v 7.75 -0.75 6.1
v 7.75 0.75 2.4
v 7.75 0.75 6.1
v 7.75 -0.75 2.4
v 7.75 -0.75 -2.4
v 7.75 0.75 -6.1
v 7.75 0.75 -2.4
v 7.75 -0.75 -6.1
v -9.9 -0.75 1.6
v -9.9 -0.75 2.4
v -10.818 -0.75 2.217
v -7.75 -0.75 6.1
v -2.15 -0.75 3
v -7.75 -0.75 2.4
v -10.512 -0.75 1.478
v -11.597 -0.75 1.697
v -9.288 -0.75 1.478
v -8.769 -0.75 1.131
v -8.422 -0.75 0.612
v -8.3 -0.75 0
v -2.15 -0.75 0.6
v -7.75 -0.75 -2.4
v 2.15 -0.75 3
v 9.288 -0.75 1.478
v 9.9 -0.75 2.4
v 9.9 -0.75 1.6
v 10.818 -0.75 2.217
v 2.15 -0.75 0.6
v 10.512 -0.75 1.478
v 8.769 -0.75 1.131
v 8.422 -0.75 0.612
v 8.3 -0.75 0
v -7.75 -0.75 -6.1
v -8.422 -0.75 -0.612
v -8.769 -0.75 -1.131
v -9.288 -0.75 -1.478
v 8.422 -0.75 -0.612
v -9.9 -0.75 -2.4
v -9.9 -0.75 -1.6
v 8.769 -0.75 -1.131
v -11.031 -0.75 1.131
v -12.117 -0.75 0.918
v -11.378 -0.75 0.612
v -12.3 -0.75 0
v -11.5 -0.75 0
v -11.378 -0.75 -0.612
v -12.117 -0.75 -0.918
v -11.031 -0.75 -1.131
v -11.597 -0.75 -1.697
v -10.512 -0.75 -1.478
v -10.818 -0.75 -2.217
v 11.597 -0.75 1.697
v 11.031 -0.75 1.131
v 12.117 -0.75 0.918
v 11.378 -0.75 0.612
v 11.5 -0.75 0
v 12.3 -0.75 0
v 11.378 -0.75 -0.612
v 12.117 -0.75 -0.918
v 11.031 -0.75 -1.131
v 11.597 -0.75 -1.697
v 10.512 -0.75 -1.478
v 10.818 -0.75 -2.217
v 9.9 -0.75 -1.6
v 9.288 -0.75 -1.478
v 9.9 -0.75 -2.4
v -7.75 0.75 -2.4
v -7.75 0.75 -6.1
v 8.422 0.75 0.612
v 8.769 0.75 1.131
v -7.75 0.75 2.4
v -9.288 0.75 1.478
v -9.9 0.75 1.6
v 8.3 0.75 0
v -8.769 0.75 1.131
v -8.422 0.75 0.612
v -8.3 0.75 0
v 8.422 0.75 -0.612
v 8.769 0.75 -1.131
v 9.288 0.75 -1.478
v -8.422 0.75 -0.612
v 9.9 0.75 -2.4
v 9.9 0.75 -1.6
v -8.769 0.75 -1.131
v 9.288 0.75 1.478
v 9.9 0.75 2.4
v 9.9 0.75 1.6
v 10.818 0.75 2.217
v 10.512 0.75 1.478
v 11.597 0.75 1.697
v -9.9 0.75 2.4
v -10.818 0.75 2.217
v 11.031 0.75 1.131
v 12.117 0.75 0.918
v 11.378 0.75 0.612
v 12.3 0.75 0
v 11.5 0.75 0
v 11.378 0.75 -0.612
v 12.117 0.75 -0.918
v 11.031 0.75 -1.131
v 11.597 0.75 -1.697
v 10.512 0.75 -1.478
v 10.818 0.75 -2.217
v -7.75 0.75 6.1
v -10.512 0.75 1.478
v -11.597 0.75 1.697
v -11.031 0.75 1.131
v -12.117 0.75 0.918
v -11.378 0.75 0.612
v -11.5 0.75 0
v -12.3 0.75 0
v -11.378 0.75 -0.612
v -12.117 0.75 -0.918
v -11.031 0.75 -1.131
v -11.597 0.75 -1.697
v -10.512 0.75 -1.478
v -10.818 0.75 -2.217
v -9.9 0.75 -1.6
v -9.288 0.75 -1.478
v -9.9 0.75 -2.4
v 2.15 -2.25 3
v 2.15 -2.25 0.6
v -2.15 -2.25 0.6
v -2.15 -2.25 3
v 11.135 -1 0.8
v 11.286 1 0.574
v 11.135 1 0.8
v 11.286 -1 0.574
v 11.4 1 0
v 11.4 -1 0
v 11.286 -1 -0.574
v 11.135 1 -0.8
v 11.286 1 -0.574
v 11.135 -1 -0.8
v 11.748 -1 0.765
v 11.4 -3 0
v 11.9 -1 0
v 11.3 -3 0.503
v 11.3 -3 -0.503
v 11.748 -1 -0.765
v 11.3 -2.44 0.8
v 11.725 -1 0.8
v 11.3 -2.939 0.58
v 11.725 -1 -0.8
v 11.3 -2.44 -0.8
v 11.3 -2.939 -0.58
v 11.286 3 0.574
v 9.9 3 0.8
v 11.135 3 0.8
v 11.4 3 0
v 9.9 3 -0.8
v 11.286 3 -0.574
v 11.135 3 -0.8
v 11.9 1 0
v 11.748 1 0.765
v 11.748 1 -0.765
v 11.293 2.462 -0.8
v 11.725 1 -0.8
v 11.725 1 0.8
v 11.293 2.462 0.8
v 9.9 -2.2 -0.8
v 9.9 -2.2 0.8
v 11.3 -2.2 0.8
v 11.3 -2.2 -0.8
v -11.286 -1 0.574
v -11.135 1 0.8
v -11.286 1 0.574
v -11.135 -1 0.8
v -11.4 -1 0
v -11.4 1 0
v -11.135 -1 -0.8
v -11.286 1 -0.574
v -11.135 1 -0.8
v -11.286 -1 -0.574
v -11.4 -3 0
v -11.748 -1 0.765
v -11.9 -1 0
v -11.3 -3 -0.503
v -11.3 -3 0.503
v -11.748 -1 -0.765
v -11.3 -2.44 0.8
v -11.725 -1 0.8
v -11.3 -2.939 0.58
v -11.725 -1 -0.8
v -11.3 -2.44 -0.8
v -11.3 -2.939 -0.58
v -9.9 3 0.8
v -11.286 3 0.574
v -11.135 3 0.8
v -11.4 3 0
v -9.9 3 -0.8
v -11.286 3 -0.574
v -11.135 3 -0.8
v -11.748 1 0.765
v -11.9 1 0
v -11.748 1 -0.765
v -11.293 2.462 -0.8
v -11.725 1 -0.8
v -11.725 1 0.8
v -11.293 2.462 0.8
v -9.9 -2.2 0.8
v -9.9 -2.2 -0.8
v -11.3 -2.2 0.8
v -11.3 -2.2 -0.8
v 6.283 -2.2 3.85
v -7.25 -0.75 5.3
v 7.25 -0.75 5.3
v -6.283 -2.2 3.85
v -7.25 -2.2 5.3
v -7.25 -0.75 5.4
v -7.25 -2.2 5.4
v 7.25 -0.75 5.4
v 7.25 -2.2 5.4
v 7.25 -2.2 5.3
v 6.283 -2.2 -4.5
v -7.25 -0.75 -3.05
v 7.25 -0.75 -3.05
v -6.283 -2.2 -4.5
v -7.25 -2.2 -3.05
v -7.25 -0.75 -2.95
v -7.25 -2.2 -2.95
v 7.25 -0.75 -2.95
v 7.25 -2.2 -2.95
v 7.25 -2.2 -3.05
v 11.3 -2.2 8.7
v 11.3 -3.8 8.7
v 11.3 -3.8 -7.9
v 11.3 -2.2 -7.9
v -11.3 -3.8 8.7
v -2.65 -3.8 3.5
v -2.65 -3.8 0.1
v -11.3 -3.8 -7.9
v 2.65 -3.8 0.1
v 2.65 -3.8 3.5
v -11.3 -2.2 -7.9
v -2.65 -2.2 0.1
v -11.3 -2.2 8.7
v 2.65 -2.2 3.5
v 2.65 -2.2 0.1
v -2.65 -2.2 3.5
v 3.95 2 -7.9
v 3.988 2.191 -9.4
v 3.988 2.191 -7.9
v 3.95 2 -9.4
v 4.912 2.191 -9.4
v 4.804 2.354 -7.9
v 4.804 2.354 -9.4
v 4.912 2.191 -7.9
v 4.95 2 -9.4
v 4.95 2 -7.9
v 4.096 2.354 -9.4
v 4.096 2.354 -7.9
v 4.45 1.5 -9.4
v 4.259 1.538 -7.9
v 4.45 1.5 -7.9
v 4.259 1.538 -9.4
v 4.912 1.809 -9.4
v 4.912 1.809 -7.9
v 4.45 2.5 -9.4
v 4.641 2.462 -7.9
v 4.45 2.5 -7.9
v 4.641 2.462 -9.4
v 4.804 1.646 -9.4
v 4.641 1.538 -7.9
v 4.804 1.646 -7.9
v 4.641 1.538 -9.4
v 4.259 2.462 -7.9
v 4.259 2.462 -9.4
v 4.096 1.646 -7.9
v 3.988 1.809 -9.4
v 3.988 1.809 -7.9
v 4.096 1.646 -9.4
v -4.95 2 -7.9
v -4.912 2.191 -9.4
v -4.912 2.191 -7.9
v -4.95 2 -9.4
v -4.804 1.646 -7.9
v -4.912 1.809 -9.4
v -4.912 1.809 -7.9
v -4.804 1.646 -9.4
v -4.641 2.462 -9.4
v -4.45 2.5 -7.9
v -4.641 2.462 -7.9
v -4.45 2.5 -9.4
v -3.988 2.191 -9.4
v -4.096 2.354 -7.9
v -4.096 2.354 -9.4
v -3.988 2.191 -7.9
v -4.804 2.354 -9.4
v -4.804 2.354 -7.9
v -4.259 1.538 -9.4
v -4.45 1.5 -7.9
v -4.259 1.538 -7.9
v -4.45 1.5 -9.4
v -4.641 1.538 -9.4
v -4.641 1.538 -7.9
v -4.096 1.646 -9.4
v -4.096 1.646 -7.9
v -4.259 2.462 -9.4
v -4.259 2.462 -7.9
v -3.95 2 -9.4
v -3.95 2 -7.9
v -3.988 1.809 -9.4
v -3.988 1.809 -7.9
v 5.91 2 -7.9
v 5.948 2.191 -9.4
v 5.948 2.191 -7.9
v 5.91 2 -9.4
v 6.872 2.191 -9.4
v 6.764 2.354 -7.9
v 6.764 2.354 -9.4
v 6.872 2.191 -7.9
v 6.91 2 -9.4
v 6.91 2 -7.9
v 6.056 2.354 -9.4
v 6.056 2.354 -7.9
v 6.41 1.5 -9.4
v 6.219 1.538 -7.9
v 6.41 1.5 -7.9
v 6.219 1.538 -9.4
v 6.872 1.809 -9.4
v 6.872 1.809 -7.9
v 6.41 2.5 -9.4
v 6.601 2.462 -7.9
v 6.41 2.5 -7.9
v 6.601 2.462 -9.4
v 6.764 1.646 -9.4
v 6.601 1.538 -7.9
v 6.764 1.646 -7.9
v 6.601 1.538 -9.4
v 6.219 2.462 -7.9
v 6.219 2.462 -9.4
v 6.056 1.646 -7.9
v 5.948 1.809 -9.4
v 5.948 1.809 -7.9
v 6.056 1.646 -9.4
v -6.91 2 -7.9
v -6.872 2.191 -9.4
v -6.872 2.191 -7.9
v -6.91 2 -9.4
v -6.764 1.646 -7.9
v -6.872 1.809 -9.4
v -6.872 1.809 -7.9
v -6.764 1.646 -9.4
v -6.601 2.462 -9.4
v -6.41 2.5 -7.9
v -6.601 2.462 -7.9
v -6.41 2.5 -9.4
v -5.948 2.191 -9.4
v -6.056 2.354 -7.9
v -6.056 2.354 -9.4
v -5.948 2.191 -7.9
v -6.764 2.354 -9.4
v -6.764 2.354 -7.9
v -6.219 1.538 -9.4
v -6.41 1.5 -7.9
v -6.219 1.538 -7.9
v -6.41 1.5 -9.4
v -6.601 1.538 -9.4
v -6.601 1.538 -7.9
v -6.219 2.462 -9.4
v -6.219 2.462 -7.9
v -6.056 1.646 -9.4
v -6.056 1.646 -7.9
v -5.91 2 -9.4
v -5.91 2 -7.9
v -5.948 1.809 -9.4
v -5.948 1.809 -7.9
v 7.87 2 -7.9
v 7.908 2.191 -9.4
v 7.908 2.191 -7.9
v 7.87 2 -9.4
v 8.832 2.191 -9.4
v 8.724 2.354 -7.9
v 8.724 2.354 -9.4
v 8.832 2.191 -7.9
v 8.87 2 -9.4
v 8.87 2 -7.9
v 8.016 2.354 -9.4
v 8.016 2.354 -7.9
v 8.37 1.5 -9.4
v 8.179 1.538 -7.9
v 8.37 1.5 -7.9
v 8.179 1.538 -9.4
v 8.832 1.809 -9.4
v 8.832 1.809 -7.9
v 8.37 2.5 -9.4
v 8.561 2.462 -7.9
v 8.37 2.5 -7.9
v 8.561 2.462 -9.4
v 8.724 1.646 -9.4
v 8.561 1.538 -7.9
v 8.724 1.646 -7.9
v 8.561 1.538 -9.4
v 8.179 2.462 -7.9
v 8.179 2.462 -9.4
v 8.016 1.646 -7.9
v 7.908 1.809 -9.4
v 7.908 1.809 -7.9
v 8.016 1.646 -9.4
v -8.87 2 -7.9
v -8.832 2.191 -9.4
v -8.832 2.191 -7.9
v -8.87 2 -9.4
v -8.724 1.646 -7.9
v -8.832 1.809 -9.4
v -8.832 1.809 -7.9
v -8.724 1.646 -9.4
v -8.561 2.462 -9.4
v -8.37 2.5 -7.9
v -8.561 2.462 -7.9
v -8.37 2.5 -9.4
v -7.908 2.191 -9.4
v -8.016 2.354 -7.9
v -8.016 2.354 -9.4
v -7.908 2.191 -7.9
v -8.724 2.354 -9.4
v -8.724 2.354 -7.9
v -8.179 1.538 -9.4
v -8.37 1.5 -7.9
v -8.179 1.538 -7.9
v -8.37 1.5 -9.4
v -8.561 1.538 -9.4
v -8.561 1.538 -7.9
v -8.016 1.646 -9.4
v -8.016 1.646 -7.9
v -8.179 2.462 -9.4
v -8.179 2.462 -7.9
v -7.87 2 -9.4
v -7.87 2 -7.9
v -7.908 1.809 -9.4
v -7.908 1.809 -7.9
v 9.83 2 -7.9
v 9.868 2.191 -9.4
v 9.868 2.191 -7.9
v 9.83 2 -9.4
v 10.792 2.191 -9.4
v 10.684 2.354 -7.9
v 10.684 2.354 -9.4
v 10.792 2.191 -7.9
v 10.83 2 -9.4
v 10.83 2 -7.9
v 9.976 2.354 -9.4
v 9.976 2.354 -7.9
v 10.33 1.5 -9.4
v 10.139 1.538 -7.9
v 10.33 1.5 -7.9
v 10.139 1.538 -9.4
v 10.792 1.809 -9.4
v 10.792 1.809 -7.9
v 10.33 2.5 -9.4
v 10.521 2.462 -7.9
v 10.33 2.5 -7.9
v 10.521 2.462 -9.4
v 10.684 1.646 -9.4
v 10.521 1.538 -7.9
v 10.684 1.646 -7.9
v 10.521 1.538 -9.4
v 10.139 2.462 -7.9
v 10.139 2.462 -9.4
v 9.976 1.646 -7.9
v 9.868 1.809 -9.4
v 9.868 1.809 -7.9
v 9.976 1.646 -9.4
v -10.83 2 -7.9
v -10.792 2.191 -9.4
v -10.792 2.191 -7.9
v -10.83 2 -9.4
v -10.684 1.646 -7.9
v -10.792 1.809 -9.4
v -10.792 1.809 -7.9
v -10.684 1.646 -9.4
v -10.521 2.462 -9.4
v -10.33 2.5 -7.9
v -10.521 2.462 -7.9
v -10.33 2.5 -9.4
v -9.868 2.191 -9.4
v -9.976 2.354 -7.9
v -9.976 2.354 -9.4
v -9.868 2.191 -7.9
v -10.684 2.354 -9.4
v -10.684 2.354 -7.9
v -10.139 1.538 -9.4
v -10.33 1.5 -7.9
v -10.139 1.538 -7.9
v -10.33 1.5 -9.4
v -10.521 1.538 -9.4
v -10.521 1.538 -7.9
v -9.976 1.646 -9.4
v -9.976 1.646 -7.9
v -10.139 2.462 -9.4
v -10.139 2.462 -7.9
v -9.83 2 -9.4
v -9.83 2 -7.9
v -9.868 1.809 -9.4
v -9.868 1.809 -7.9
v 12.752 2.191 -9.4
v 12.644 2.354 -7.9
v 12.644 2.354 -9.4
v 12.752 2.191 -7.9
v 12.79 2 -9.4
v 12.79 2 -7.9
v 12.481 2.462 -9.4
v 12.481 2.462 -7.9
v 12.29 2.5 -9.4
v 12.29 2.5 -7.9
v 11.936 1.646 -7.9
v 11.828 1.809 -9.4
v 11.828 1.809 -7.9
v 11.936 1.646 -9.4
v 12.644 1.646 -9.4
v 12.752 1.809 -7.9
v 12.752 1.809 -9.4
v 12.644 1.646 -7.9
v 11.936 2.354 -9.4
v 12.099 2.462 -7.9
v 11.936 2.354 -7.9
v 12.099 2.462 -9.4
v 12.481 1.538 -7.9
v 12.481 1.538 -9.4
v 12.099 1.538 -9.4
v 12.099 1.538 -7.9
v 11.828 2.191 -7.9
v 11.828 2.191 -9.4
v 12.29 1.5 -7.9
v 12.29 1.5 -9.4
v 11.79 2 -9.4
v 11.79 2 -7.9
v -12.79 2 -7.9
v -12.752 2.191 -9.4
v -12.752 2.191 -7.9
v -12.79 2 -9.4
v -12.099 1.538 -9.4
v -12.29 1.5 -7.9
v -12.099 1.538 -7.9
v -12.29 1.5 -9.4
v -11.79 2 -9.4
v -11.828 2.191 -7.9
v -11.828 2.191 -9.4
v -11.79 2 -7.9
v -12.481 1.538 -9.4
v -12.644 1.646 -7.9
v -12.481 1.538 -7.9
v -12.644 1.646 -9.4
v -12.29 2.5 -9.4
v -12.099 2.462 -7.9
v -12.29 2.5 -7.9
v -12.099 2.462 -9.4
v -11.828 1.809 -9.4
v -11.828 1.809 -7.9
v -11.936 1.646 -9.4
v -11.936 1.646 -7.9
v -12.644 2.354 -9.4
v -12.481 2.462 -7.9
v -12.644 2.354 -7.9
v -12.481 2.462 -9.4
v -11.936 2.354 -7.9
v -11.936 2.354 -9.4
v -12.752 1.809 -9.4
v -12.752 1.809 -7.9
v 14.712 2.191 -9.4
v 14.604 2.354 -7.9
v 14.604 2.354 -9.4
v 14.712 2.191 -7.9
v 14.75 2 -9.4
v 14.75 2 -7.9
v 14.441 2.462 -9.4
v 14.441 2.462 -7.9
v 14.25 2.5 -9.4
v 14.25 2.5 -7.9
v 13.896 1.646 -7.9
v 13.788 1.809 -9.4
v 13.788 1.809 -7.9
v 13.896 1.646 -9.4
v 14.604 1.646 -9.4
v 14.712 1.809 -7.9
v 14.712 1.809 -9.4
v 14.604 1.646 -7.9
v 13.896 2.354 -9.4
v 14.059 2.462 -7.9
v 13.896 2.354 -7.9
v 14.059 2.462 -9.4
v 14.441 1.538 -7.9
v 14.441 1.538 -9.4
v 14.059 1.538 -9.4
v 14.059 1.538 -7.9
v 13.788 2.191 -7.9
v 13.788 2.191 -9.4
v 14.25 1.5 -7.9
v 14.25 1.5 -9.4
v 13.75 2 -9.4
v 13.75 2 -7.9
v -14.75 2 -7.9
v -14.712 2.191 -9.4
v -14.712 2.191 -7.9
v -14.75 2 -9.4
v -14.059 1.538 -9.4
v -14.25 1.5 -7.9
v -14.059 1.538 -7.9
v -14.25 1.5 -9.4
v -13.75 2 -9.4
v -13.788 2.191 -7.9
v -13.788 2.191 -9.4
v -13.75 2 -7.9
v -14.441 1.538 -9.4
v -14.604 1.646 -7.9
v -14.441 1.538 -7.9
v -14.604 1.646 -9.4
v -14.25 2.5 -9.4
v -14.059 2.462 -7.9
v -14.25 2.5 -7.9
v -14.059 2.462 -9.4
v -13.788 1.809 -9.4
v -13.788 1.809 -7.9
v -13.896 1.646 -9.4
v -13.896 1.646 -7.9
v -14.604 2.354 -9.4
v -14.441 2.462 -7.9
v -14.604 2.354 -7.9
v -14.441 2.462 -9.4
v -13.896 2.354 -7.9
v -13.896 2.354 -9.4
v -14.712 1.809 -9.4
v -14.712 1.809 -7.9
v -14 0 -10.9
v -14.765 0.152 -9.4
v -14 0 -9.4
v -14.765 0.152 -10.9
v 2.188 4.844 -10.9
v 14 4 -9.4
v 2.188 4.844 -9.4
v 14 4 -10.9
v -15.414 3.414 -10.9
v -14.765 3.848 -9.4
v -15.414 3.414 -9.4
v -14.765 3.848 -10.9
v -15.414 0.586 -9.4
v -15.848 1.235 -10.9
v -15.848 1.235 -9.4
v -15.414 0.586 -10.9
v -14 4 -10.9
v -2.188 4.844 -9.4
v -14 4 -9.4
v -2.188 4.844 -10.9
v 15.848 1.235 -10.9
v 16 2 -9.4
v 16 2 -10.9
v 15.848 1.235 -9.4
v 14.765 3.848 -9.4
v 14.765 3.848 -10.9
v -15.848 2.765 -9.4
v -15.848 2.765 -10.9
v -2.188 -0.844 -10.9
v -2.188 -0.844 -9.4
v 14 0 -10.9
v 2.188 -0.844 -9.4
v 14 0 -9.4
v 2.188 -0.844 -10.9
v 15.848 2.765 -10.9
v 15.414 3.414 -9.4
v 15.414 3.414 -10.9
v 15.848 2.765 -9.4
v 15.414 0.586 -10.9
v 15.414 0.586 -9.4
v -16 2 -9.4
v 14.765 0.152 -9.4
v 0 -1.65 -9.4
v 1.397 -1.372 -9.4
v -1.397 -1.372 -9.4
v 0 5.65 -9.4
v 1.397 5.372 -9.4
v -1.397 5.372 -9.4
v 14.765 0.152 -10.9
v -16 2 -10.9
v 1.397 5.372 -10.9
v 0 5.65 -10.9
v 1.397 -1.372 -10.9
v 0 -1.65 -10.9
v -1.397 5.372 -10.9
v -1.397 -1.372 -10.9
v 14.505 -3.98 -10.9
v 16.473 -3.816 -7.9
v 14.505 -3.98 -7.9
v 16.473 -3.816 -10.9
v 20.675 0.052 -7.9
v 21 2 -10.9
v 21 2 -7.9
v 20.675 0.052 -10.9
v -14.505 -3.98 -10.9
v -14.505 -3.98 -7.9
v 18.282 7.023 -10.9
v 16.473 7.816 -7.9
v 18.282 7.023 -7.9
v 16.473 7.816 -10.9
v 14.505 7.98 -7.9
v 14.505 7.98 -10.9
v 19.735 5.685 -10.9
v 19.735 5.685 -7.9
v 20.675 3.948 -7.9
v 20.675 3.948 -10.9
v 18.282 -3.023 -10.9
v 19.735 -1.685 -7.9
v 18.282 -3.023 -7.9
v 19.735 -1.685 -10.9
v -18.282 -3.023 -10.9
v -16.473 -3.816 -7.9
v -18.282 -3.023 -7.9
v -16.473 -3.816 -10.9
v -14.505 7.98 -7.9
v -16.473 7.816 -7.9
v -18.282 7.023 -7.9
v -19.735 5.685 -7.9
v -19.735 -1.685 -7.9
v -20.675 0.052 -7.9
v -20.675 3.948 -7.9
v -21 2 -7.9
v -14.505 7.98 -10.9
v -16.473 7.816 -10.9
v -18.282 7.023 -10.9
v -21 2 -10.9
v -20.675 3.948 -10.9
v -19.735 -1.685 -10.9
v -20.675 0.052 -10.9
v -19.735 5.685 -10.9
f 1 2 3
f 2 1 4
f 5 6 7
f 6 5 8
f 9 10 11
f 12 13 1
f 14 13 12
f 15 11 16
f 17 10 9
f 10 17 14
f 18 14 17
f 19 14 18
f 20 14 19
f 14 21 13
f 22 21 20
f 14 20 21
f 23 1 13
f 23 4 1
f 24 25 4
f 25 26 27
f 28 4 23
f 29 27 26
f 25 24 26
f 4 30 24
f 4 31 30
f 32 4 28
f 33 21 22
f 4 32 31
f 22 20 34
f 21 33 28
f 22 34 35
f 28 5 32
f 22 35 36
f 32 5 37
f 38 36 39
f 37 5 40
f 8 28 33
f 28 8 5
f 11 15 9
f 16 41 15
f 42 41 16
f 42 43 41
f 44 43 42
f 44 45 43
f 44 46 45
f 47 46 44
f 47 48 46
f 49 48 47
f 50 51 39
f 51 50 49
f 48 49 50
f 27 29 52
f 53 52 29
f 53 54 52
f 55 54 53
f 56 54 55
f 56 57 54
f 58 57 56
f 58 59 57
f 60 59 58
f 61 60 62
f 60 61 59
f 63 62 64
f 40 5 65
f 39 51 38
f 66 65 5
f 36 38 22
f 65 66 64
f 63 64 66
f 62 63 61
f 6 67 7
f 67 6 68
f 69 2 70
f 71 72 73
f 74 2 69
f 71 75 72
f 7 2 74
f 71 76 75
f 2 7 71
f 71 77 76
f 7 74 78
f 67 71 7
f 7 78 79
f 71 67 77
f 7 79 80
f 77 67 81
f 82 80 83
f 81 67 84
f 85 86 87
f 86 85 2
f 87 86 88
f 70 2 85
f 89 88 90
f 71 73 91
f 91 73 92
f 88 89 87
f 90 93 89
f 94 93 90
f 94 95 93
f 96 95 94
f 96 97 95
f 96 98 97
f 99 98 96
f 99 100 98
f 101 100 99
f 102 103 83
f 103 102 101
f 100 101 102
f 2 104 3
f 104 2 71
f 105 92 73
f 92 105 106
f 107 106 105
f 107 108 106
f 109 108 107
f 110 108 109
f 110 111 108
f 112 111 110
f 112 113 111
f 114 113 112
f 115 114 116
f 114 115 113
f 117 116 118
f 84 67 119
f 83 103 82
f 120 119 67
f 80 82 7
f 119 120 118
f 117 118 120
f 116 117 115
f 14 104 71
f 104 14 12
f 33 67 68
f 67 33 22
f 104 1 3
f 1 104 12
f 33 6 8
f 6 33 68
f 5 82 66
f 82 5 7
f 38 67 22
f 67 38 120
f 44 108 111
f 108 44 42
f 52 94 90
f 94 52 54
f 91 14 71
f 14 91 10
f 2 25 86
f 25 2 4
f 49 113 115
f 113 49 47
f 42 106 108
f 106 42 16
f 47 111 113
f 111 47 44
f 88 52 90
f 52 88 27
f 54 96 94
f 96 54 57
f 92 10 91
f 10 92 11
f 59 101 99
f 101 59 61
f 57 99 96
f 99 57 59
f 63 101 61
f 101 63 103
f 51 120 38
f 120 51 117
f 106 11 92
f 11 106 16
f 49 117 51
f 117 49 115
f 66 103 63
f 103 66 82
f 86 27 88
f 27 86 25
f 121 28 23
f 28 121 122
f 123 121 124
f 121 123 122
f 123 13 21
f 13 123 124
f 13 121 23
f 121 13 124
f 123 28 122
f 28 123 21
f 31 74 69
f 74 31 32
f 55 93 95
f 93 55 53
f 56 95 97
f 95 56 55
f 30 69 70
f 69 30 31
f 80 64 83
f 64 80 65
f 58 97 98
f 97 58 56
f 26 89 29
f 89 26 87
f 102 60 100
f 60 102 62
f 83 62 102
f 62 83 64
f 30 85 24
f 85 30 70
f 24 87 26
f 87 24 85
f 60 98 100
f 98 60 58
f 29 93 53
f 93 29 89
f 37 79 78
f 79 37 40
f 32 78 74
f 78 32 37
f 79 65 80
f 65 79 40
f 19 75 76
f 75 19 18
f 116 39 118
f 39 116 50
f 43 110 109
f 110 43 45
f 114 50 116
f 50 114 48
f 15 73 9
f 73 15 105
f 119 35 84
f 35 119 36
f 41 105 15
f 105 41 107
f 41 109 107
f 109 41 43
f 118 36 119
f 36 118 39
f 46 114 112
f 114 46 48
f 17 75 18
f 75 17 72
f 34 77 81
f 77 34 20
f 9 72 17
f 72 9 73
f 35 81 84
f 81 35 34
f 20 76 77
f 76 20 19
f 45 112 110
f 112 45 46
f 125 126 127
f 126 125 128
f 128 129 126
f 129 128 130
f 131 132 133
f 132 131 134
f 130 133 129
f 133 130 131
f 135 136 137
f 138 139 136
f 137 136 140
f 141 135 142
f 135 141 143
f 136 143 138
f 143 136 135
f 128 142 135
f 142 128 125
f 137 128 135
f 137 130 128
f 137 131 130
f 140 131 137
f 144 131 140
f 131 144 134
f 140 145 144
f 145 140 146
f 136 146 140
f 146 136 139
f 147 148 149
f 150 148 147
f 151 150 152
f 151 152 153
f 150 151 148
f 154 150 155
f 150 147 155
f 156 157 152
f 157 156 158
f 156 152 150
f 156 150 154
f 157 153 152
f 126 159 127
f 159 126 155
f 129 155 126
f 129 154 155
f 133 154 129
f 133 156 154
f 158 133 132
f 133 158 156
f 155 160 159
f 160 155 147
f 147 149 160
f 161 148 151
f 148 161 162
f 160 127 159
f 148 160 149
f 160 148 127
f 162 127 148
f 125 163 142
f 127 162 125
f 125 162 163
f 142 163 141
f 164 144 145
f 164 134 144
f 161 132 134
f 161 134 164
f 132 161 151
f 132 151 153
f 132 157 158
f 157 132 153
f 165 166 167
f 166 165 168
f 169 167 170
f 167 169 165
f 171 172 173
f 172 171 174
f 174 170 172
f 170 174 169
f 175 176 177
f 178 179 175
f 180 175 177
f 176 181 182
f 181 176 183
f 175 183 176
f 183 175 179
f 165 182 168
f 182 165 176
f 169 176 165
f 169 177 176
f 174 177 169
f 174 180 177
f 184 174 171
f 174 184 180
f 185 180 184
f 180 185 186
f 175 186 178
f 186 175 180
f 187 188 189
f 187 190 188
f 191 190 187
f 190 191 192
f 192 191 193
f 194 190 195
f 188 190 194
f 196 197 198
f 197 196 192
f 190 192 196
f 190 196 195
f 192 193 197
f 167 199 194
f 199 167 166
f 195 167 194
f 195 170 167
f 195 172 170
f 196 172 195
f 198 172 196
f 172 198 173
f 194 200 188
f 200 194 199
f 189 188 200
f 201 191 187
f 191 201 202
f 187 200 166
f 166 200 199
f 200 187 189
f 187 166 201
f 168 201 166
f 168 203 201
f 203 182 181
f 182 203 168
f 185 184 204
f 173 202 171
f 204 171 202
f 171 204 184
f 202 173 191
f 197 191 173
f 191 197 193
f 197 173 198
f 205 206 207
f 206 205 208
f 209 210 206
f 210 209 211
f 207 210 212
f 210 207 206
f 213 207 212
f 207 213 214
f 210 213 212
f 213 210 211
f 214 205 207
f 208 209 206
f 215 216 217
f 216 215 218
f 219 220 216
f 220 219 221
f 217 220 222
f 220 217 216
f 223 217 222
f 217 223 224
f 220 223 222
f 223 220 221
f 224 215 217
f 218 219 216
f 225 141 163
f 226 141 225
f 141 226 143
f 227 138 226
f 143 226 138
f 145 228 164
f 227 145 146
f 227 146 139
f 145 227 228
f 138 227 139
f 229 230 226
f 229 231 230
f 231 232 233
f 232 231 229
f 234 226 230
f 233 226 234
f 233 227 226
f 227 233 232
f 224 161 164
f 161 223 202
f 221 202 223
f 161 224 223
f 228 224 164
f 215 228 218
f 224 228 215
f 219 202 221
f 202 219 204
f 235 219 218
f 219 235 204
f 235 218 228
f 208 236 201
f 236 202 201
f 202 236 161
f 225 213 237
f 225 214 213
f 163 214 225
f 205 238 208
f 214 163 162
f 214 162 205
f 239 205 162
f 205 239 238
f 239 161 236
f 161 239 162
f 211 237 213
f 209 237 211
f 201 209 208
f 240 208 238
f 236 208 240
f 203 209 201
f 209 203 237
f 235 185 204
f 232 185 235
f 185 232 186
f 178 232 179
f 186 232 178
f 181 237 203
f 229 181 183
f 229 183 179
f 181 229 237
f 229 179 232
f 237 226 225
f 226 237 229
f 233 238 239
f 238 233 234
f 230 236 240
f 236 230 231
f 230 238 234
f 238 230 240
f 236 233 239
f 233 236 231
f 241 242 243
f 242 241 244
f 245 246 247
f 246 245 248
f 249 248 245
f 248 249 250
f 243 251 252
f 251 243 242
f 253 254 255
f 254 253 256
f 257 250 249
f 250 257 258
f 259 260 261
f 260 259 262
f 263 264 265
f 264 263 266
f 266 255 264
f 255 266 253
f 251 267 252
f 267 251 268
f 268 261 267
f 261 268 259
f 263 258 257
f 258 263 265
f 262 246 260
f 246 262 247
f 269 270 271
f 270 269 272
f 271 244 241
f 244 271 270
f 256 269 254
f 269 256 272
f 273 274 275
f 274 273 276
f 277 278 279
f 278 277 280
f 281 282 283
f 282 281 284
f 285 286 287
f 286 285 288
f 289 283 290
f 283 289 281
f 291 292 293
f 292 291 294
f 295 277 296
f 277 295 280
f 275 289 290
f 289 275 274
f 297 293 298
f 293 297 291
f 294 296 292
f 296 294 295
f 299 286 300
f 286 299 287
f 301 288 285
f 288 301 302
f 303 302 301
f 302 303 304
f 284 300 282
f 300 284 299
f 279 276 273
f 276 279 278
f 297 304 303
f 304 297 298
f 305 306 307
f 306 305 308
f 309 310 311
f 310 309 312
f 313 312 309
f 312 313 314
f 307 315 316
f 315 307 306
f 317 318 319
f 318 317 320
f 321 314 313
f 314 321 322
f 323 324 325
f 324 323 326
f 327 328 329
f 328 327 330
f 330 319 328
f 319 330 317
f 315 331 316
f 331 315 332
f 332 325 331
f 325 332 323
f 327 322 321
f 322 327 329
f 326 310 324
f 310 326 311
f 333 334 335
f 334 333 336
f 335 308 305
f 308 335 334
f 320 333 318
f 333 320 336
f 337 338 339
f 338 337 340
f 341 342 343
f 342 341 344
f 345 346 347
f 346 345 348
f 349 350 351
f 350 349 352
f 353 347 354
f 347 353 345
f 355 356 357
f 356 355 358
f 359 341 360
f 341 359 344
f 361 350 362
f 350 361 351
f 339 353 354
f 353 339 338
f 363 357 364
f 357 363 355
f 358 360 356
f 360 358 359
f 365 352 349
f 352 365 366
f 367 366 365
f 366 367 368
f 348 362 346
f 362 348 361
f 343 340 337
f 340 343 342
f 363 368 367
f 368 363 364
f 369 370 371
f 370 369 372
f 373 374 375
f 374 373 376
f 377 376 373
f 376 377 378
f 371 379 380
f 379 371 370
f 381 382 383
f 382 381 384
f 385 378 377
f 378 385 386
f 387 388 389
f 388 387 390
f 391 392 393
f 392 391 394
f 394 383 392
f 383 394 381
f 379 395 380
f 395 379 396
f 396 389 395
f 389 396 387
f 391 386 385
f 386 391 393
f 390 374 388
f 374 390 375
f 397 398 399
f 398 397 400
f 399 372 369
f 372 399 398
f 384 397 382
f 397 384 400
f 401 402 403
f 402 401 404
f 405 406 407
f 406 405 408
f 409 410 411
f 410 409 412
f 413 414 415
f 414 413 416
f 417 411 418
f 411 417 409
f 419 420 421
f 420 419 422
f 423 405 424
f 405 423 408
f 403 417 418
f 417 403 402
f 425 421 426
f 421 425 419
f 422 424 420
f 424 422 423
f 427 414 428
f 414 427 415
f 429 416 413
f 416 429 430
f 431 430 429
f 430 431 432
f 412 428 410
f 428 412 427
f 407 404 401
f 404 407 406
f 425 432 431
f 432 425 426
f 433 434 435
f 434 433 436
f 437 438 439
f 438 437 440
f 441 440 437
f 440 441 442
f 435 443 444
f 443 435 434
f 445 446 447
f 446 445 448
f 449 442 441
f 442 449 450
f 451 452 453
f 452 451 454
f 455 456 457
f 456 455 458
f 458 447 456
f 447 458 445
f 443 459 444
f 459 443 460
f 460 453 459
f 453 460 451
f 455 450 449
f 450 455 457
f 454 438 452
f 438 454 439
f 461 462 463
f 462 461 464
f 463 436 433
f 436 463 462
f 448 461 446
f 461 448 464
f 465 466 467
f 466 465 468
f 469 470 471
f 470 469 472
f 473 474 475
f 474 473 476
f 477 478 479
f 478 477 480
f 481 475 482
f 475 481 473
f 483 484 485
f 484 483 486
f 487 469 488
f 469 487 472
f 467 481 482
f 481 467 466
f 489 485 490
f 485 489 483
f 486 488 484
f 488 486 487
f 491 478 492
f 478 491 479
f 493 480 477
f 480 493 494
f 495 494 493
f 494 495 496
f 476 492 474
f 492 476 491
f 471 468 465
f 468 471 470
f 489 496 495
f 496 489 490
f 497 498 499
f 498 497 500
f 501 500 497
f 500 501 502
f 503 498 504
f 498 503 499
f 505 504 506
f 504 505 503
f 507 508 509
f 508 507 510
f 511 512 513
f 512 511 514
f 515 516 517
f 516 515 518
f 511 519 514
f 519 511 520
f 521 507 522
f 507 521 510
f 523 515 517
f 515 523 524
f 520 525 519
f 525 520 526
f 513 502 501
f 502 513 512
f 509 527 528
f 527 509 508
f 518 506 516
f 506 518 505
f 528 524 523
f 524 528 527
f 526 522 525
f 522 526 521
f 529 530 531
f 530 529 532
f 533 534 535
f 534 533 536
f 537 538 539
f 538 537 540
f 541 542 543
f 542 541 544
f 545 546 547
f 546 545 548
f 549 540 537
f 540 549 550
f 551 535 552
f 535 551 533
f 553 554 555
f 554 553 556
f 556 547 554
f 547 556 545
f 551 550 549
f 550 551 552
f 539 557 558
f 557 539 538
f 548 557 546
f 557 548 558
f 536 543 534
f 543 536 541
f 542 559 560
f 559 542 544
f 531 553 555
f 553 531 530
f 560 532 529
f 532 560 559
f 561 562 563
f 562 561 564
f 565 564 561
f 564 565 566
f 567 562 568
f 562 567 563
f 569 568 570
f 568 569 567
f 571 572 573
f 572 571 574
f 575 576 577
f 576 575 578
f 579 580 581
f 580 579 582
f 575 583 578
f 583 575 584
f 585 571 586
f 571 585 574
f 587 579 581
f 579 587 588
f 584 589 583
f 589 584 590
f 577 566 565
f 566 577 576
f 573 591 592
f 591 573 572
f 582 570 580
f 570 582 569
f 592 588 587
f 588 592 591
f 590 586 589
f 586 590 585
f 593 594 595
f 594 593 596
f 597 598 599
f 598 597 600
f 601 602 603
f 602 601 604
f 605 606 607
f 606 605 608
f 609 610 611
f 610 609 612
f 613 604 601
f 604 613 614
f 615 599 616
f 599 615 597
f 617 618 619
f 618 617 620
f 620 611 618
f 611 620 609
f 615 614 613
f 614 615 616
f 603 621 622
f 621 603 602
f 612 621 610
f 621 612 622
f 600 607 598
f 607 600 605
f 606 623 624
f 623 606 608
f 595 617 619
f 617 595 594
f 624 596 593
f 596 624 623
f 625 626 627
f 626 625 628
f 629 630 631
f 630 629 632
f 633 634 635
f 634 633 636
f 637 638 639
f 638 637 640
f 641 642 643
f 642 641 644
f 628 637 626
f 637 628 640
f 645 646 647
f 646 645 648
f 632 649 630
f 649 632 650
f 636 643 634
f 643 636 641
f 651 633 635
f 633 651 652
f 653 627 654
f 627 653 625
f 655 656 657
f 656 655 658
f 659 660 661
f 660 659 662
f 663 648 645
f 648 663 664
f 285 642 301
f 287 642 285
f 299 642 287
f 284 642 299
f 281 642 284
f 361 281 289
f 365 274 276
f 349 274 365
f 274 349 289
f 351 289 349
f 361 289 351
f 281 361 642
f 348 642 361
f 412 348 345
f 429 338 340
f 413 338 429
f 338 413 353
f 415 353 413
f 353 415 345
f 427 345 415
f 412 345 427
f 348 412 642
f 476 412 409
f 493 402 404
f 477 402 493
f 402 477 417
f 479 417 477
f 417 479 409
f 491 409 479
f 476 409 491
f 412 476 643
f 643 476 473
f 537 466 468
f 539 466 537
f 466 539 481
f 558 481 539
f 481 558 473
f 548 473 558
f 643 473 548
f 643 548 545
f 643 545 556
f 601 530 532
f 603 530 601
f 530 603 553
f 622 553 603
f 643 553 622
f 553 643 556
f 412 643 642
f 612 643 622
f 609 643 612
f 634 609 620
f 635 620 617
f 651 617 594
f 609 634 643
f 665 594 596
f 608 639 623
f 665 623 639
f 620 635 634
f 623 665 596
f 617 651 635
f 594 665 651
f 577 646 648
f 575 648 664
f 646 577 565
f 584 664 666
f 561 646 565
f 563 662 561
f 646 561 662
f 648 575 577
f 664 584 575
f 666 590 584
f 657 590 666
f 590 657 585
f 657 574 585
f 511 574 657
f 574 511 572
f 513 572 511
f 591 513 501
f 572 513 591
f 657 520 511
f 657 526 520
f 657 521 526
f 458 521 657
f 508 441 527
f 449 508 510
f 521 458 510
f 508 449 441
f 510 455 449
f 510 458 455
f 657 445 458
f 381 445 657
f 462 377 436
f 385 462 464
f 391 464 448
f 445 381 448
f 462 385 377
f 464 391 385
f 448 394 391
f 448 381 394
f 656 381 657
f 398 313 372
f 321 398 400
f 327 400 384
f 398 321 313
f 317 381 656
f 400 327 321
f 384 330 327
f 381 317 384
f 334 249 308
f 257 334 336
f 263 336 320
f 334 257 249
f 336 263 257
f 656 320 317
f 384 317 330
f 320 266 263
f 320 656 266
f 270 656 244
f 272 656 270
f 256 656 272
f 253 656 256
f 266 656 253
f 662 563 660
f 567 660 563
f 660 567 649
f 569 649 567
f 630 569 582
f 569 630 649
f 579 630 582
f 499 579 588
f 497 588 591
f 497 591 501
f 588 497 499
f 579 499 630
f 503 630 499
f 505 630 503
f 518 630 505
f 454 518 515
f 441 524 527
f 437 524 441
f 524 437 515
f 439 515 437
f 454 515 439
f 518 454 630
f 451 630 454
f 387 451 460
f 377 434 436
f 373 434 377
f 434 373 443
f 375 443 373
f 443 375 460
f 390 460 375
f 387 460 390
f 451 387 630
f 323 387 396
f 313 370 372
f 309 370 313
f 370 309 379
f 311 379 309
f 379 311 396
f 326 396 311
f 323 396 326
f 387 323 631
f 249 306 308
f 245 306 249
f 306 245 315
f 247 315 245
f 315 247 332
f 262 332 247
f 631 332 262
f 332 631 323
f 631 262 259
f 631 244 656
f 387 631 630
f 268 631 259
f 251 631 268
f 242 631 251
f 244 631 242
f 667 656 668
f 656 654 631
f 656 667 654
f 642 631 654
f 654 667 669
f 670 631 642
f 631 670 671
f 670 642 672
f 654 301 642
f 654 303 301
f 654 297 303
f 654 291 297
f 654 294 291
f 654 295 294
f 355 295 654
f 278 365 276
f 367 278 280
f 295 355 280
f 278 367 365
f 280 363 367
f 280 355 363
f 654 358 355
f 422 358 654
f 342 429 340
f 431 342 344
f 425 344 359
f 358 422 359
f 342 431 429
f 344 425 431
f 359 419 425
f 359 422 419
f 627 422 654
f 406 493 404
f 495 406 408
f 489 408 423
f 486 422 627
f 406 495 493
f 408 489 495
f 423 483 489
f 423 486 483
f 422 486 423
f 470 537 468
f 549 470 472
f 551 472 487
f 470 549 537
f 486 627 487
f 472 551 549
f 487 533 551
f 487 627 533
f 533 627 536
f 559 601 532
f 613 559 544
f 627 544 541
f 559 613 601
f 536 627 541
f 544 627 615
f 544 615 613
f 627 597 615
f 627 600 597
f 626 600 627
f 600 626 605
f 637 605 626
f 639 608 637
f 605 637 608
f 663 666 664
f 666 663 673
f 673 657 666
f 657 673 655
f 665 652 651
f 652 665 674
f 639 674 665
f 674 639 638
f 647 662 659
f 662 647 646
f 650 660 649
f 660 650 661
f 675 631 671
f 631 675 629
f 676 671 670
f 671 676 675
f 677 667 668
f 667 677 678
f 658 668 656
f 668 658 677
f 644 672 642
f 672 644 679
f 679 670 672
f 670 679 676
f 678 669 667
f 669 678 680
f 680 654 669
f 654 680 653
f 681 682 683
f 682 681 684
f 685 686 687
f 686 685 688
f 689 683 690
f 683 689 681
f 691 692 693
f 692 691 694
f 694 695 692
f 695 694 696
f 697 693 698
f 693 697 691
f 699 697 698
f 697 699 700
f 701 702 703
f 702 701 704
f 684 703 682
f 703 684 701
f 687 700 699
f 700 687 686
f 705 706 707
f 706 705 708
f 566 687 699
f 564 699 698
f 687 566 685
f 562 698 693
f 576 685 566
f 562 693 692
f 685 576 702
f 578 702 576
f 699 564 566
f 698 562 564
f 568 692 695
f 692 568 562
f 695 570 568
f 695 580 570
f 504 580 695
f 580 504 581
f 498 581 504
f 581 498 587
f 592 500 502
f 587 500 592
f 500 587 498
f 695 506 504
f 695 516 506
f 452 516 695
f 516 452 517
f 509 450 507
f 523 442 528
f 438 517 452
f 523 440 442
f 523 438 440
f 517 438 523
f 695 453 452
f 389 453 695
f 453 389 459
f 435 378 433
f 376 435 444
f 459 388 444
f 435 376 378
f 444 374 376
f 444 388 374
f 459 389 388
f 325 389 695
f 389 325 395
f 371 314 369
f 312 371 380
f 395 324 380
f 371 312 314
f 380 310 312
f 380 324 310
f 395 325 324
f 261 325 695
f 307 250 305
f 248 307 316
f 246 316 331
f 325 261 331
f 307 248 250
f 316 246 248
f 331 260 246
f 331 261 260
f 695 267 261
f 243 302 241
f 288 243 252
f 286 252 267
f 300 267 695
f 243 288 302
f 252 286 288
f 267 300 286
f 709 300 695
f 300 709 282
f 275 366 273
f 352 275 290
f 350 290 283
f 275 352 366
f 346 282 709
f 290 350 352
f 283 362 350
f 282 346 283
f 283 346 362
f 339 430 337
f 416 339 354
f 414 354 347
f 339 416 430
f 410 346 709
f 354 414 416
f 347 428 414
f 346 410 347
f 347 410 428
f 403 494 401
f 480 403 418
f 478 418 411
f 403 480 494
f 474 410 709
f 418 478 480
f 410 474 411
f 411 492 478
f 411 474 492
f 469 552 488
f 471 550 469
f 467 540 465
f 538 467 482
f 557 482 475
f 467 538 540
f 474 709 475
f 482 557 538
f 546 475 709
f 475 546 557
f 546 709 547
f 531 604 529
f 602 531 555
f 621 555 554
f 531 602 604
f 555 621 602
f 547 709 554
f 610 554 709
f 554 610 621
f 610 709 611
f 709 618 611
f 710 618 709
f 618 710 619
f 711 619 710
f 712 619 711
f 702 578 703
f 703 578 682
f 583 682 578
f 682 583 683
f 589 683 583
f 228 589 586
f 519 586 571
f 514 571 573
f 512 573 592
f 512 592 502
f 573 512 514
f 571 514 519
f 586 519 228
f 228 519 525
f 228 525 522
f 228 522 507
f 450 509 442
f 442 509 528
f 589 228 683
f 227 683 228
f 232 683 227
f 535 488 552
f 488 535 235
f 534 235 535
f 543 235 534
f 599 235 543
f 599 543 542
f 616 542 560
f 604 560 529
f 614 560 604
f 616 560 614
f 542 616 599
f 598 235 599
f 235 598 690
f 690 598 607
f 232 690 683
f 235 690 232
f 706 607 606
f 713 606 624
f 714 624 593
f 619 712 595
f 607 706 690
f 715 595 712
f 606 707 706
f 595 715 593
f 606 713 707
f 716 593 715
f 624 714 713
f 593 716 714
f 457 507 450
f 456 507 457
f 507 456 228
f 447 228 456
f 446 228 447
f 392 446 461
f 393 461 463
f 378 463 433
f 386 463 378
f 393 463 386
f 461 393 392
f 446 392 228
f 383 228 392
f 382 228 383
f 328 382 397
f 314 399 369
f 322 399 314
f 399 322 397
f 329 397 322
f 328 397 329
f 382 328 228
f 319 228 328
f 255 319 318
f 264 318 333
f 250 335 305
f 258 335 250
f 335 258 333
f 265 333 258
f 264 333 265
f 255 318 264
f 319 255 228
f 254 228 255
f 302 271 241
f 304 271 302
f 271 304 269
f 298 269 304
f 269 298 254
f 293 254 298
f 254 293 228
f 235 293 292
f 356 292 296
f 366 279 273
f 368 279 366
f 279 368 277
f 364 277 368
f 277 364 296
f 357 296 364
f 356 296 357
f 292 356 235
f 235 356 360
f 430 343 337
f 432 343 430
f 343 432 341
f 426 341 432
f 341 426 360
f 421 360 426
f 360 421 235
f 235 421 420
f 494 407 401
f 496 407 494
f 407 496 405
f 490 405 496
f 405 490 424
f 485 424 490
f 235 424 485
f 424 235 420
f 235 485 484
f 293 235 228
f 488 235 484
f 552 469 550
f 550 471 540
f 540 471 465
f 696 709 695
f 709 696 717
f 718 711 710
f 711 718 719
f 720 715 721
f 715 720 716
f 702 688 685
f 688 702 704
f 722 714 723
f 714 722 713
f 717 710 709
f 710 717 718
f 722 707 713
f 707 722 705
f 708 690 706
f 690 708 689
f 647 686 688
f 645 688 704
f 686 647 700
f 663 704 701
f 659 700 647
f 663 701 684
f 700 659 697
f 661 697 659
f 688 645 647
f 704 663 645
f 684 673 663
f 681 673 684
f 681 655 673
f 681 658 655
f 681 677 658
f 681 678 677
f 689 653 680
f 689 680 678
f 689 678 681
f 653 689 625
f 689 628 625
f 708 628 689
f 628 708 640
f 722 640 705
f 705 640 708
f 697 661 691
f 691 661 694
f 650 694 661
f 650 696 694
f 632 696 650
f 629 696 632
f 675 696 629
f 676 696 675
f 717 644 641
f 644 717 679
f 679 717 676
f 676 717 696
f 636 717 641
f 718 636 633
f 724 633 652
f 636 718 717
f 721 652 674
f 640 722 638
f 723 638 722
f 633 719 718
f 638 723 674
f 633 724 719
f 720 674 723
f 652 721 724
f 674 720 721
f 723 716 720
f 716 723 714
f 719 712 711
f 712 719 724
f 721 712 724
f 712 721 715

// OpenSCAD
BOARD_D=1.5;
BOARD_H=12.2;
BOARD_W=15.5;
BOARD_HOLE_W1=16.6;
BOARD_W2=24.6;
BOARD_HOLE_D=3.2;
BOARD_HOLE_EXT=(BOARD_W2-BOARD_HOLE_W1-2*BOARD_HOLE_D)/2;

//echo "hole_ext" % BOARD_HOLE_EXT;


module symX(t) {
    translate(t)
        children();
    mirror([1,0,0])
        translate(t)
            children();
}

module atHoles() {
    symX([(BOARD_HOLE_W1+BOARD_HOLE_D)/2,0,0])
        children();
}

    B_D=[BOARD_W,BOARD_H,BOARD_D];
    CHIP_W=4.3;
    CHIP_BOARD_TOP_TO_CHIP_BOTTOM=5.5;
    CHIP_BOARD_BOTTOM_TO_CHIP_TOP=9.1;
    CHIP_H=CHIP_BOARD_BOTTOM_TO_CHIP_TOP+CHIP_BOARD_TOP_TO_CHIP_BOTTOM-BOARD_H;
    CHIP_Y=CHIP_BOARD_BOTTOM_TO_CHIP_TOP-CHIP_H/2-BOARD_H/2;
//    CHIP_Y=-(CHIP_BOARD_TOP_TO_CHIP_BOTTOM-CHIP_H/2-BOARD_H/2);
//    CHIP_HH=10;
    CHIP_HH=BOARD_D;

module sensorChip(extend=0,h=CHIP_HH){
    color([0,0,1])
    translate([0,CHIP_Y,BOARD_D])
    cube([CHIP_W+extend,CHIP_H+extend,h],center=true);
}

module pcb() {
    
    difference() {
        union() {
            sensorChip();
            color([0,.7,0]) {
            cube(B_D,center=true);
            hull()
            atHoles()
            cylinder($fn=16,d=BOARD_HOLE_D+BOARD_HOLE_EXT*2,h=BOARD_D,center=true);
            }
        }
        atHoles() {
            cylinder($fn=16,d=BOARD_HOLE_D,h=BOARD_D+1,center=true);
        }
    }
    
    
}

    W=1.6;
    HOLDER_W=BOARD_W2-2;
    HOLDER_H=2*W+BOARD_H+2;

module holder() {
    P_SIZE=BOARD_D+.5;
    eps=1e-4;
    atHoles() {
        intersection() {
            color([1,0,1]) {
                cylinder($fn=16,d=3,h=BOARD_D+.5,center=true);
                translate([0,0,P_SIZE-eps])
                cylinder($fn=16,d1=4,d2=3,h=BOARD_D+.5,center=true);
                translate([0,0,-P_SIZE+eps])
                cylinder($fn=16,d1=3,d2=4,h=BOARD_D+.5,center=true);
            }
            translate([0,-BOARD_HOLE_D/4,-6])
            cube([10,BOARD_HOLE_D/2,12]);
        }
    }
    
    translate([0,0,BOARD_D+eps]) {
        for(T=[BOARD_H/2-BOARD_D/2,-3])
        hull() {
            translate([0,T,0])
            cube([BOARD_W-1,.1,BOARD_D],center=true);
            translate([0,T-BOARD_D,BOARD_D/2])
            cube([BOARD_W-3,.1,eps],center=true);
        }
    }
    intersection() {
        difference() {
            translate([0,0,BOARD_D*2])
            cube([HOLDER_W,HOLDER_H,W],center=true);
            sensorChip(1,20);
        }
//        translate([0,-HOLDER_W/2-4,0])
  //      sphere(HOLDER_W);
    }
}
module servoHorn(height=1.6){
    L=32;
    DE=4;
    DI0=6;
    DI1=7.3;
    T=height;
    
    $fn=16;
    hull() {
        symX([L/2 - DE/2,0,0])
            cylinder(h=T,d=DE,center=true);
        cylinder(h=T,d=DI0,center=true);
    }
    cylinder(h=T,d=DI1,center=true);
    
    HD0=28.5;
    HD5=8.9;
    S=(HD0-HD5)/10;
    echo(5*S);
    
    for(x=[HD5/2:S:HD5/2 + 5*S+S/2]){
        symX([x,0,0])
        cylinder(h=T*5,d=1,center=true);
    }
    
}

module servoMount(){
    HH=3;
    translate([0,0,-HH/2])
    difference() {
        translate([0,0,HH/2-.7])
        hull()
        symX([30/2,0,0]) {
            cylinder(d=12,h=HH,center=true);
        }
//        cube([35,12,HH],center=true);
        servoHorn();
    }
}

module  fullMount() {
    rotate(90,[1,0,0])
    holder();
    translate([0,2,-HOLDER_H/2])
    servoMount();
    
}


mode="preview";
if(mode=="preview") {
    rotate(90,[1,0,0])
    pcb();
    fullMount();
}
if(mode=="fullMount") {
    fullMount();
}

//minkowski() {
//    cube();
//}
